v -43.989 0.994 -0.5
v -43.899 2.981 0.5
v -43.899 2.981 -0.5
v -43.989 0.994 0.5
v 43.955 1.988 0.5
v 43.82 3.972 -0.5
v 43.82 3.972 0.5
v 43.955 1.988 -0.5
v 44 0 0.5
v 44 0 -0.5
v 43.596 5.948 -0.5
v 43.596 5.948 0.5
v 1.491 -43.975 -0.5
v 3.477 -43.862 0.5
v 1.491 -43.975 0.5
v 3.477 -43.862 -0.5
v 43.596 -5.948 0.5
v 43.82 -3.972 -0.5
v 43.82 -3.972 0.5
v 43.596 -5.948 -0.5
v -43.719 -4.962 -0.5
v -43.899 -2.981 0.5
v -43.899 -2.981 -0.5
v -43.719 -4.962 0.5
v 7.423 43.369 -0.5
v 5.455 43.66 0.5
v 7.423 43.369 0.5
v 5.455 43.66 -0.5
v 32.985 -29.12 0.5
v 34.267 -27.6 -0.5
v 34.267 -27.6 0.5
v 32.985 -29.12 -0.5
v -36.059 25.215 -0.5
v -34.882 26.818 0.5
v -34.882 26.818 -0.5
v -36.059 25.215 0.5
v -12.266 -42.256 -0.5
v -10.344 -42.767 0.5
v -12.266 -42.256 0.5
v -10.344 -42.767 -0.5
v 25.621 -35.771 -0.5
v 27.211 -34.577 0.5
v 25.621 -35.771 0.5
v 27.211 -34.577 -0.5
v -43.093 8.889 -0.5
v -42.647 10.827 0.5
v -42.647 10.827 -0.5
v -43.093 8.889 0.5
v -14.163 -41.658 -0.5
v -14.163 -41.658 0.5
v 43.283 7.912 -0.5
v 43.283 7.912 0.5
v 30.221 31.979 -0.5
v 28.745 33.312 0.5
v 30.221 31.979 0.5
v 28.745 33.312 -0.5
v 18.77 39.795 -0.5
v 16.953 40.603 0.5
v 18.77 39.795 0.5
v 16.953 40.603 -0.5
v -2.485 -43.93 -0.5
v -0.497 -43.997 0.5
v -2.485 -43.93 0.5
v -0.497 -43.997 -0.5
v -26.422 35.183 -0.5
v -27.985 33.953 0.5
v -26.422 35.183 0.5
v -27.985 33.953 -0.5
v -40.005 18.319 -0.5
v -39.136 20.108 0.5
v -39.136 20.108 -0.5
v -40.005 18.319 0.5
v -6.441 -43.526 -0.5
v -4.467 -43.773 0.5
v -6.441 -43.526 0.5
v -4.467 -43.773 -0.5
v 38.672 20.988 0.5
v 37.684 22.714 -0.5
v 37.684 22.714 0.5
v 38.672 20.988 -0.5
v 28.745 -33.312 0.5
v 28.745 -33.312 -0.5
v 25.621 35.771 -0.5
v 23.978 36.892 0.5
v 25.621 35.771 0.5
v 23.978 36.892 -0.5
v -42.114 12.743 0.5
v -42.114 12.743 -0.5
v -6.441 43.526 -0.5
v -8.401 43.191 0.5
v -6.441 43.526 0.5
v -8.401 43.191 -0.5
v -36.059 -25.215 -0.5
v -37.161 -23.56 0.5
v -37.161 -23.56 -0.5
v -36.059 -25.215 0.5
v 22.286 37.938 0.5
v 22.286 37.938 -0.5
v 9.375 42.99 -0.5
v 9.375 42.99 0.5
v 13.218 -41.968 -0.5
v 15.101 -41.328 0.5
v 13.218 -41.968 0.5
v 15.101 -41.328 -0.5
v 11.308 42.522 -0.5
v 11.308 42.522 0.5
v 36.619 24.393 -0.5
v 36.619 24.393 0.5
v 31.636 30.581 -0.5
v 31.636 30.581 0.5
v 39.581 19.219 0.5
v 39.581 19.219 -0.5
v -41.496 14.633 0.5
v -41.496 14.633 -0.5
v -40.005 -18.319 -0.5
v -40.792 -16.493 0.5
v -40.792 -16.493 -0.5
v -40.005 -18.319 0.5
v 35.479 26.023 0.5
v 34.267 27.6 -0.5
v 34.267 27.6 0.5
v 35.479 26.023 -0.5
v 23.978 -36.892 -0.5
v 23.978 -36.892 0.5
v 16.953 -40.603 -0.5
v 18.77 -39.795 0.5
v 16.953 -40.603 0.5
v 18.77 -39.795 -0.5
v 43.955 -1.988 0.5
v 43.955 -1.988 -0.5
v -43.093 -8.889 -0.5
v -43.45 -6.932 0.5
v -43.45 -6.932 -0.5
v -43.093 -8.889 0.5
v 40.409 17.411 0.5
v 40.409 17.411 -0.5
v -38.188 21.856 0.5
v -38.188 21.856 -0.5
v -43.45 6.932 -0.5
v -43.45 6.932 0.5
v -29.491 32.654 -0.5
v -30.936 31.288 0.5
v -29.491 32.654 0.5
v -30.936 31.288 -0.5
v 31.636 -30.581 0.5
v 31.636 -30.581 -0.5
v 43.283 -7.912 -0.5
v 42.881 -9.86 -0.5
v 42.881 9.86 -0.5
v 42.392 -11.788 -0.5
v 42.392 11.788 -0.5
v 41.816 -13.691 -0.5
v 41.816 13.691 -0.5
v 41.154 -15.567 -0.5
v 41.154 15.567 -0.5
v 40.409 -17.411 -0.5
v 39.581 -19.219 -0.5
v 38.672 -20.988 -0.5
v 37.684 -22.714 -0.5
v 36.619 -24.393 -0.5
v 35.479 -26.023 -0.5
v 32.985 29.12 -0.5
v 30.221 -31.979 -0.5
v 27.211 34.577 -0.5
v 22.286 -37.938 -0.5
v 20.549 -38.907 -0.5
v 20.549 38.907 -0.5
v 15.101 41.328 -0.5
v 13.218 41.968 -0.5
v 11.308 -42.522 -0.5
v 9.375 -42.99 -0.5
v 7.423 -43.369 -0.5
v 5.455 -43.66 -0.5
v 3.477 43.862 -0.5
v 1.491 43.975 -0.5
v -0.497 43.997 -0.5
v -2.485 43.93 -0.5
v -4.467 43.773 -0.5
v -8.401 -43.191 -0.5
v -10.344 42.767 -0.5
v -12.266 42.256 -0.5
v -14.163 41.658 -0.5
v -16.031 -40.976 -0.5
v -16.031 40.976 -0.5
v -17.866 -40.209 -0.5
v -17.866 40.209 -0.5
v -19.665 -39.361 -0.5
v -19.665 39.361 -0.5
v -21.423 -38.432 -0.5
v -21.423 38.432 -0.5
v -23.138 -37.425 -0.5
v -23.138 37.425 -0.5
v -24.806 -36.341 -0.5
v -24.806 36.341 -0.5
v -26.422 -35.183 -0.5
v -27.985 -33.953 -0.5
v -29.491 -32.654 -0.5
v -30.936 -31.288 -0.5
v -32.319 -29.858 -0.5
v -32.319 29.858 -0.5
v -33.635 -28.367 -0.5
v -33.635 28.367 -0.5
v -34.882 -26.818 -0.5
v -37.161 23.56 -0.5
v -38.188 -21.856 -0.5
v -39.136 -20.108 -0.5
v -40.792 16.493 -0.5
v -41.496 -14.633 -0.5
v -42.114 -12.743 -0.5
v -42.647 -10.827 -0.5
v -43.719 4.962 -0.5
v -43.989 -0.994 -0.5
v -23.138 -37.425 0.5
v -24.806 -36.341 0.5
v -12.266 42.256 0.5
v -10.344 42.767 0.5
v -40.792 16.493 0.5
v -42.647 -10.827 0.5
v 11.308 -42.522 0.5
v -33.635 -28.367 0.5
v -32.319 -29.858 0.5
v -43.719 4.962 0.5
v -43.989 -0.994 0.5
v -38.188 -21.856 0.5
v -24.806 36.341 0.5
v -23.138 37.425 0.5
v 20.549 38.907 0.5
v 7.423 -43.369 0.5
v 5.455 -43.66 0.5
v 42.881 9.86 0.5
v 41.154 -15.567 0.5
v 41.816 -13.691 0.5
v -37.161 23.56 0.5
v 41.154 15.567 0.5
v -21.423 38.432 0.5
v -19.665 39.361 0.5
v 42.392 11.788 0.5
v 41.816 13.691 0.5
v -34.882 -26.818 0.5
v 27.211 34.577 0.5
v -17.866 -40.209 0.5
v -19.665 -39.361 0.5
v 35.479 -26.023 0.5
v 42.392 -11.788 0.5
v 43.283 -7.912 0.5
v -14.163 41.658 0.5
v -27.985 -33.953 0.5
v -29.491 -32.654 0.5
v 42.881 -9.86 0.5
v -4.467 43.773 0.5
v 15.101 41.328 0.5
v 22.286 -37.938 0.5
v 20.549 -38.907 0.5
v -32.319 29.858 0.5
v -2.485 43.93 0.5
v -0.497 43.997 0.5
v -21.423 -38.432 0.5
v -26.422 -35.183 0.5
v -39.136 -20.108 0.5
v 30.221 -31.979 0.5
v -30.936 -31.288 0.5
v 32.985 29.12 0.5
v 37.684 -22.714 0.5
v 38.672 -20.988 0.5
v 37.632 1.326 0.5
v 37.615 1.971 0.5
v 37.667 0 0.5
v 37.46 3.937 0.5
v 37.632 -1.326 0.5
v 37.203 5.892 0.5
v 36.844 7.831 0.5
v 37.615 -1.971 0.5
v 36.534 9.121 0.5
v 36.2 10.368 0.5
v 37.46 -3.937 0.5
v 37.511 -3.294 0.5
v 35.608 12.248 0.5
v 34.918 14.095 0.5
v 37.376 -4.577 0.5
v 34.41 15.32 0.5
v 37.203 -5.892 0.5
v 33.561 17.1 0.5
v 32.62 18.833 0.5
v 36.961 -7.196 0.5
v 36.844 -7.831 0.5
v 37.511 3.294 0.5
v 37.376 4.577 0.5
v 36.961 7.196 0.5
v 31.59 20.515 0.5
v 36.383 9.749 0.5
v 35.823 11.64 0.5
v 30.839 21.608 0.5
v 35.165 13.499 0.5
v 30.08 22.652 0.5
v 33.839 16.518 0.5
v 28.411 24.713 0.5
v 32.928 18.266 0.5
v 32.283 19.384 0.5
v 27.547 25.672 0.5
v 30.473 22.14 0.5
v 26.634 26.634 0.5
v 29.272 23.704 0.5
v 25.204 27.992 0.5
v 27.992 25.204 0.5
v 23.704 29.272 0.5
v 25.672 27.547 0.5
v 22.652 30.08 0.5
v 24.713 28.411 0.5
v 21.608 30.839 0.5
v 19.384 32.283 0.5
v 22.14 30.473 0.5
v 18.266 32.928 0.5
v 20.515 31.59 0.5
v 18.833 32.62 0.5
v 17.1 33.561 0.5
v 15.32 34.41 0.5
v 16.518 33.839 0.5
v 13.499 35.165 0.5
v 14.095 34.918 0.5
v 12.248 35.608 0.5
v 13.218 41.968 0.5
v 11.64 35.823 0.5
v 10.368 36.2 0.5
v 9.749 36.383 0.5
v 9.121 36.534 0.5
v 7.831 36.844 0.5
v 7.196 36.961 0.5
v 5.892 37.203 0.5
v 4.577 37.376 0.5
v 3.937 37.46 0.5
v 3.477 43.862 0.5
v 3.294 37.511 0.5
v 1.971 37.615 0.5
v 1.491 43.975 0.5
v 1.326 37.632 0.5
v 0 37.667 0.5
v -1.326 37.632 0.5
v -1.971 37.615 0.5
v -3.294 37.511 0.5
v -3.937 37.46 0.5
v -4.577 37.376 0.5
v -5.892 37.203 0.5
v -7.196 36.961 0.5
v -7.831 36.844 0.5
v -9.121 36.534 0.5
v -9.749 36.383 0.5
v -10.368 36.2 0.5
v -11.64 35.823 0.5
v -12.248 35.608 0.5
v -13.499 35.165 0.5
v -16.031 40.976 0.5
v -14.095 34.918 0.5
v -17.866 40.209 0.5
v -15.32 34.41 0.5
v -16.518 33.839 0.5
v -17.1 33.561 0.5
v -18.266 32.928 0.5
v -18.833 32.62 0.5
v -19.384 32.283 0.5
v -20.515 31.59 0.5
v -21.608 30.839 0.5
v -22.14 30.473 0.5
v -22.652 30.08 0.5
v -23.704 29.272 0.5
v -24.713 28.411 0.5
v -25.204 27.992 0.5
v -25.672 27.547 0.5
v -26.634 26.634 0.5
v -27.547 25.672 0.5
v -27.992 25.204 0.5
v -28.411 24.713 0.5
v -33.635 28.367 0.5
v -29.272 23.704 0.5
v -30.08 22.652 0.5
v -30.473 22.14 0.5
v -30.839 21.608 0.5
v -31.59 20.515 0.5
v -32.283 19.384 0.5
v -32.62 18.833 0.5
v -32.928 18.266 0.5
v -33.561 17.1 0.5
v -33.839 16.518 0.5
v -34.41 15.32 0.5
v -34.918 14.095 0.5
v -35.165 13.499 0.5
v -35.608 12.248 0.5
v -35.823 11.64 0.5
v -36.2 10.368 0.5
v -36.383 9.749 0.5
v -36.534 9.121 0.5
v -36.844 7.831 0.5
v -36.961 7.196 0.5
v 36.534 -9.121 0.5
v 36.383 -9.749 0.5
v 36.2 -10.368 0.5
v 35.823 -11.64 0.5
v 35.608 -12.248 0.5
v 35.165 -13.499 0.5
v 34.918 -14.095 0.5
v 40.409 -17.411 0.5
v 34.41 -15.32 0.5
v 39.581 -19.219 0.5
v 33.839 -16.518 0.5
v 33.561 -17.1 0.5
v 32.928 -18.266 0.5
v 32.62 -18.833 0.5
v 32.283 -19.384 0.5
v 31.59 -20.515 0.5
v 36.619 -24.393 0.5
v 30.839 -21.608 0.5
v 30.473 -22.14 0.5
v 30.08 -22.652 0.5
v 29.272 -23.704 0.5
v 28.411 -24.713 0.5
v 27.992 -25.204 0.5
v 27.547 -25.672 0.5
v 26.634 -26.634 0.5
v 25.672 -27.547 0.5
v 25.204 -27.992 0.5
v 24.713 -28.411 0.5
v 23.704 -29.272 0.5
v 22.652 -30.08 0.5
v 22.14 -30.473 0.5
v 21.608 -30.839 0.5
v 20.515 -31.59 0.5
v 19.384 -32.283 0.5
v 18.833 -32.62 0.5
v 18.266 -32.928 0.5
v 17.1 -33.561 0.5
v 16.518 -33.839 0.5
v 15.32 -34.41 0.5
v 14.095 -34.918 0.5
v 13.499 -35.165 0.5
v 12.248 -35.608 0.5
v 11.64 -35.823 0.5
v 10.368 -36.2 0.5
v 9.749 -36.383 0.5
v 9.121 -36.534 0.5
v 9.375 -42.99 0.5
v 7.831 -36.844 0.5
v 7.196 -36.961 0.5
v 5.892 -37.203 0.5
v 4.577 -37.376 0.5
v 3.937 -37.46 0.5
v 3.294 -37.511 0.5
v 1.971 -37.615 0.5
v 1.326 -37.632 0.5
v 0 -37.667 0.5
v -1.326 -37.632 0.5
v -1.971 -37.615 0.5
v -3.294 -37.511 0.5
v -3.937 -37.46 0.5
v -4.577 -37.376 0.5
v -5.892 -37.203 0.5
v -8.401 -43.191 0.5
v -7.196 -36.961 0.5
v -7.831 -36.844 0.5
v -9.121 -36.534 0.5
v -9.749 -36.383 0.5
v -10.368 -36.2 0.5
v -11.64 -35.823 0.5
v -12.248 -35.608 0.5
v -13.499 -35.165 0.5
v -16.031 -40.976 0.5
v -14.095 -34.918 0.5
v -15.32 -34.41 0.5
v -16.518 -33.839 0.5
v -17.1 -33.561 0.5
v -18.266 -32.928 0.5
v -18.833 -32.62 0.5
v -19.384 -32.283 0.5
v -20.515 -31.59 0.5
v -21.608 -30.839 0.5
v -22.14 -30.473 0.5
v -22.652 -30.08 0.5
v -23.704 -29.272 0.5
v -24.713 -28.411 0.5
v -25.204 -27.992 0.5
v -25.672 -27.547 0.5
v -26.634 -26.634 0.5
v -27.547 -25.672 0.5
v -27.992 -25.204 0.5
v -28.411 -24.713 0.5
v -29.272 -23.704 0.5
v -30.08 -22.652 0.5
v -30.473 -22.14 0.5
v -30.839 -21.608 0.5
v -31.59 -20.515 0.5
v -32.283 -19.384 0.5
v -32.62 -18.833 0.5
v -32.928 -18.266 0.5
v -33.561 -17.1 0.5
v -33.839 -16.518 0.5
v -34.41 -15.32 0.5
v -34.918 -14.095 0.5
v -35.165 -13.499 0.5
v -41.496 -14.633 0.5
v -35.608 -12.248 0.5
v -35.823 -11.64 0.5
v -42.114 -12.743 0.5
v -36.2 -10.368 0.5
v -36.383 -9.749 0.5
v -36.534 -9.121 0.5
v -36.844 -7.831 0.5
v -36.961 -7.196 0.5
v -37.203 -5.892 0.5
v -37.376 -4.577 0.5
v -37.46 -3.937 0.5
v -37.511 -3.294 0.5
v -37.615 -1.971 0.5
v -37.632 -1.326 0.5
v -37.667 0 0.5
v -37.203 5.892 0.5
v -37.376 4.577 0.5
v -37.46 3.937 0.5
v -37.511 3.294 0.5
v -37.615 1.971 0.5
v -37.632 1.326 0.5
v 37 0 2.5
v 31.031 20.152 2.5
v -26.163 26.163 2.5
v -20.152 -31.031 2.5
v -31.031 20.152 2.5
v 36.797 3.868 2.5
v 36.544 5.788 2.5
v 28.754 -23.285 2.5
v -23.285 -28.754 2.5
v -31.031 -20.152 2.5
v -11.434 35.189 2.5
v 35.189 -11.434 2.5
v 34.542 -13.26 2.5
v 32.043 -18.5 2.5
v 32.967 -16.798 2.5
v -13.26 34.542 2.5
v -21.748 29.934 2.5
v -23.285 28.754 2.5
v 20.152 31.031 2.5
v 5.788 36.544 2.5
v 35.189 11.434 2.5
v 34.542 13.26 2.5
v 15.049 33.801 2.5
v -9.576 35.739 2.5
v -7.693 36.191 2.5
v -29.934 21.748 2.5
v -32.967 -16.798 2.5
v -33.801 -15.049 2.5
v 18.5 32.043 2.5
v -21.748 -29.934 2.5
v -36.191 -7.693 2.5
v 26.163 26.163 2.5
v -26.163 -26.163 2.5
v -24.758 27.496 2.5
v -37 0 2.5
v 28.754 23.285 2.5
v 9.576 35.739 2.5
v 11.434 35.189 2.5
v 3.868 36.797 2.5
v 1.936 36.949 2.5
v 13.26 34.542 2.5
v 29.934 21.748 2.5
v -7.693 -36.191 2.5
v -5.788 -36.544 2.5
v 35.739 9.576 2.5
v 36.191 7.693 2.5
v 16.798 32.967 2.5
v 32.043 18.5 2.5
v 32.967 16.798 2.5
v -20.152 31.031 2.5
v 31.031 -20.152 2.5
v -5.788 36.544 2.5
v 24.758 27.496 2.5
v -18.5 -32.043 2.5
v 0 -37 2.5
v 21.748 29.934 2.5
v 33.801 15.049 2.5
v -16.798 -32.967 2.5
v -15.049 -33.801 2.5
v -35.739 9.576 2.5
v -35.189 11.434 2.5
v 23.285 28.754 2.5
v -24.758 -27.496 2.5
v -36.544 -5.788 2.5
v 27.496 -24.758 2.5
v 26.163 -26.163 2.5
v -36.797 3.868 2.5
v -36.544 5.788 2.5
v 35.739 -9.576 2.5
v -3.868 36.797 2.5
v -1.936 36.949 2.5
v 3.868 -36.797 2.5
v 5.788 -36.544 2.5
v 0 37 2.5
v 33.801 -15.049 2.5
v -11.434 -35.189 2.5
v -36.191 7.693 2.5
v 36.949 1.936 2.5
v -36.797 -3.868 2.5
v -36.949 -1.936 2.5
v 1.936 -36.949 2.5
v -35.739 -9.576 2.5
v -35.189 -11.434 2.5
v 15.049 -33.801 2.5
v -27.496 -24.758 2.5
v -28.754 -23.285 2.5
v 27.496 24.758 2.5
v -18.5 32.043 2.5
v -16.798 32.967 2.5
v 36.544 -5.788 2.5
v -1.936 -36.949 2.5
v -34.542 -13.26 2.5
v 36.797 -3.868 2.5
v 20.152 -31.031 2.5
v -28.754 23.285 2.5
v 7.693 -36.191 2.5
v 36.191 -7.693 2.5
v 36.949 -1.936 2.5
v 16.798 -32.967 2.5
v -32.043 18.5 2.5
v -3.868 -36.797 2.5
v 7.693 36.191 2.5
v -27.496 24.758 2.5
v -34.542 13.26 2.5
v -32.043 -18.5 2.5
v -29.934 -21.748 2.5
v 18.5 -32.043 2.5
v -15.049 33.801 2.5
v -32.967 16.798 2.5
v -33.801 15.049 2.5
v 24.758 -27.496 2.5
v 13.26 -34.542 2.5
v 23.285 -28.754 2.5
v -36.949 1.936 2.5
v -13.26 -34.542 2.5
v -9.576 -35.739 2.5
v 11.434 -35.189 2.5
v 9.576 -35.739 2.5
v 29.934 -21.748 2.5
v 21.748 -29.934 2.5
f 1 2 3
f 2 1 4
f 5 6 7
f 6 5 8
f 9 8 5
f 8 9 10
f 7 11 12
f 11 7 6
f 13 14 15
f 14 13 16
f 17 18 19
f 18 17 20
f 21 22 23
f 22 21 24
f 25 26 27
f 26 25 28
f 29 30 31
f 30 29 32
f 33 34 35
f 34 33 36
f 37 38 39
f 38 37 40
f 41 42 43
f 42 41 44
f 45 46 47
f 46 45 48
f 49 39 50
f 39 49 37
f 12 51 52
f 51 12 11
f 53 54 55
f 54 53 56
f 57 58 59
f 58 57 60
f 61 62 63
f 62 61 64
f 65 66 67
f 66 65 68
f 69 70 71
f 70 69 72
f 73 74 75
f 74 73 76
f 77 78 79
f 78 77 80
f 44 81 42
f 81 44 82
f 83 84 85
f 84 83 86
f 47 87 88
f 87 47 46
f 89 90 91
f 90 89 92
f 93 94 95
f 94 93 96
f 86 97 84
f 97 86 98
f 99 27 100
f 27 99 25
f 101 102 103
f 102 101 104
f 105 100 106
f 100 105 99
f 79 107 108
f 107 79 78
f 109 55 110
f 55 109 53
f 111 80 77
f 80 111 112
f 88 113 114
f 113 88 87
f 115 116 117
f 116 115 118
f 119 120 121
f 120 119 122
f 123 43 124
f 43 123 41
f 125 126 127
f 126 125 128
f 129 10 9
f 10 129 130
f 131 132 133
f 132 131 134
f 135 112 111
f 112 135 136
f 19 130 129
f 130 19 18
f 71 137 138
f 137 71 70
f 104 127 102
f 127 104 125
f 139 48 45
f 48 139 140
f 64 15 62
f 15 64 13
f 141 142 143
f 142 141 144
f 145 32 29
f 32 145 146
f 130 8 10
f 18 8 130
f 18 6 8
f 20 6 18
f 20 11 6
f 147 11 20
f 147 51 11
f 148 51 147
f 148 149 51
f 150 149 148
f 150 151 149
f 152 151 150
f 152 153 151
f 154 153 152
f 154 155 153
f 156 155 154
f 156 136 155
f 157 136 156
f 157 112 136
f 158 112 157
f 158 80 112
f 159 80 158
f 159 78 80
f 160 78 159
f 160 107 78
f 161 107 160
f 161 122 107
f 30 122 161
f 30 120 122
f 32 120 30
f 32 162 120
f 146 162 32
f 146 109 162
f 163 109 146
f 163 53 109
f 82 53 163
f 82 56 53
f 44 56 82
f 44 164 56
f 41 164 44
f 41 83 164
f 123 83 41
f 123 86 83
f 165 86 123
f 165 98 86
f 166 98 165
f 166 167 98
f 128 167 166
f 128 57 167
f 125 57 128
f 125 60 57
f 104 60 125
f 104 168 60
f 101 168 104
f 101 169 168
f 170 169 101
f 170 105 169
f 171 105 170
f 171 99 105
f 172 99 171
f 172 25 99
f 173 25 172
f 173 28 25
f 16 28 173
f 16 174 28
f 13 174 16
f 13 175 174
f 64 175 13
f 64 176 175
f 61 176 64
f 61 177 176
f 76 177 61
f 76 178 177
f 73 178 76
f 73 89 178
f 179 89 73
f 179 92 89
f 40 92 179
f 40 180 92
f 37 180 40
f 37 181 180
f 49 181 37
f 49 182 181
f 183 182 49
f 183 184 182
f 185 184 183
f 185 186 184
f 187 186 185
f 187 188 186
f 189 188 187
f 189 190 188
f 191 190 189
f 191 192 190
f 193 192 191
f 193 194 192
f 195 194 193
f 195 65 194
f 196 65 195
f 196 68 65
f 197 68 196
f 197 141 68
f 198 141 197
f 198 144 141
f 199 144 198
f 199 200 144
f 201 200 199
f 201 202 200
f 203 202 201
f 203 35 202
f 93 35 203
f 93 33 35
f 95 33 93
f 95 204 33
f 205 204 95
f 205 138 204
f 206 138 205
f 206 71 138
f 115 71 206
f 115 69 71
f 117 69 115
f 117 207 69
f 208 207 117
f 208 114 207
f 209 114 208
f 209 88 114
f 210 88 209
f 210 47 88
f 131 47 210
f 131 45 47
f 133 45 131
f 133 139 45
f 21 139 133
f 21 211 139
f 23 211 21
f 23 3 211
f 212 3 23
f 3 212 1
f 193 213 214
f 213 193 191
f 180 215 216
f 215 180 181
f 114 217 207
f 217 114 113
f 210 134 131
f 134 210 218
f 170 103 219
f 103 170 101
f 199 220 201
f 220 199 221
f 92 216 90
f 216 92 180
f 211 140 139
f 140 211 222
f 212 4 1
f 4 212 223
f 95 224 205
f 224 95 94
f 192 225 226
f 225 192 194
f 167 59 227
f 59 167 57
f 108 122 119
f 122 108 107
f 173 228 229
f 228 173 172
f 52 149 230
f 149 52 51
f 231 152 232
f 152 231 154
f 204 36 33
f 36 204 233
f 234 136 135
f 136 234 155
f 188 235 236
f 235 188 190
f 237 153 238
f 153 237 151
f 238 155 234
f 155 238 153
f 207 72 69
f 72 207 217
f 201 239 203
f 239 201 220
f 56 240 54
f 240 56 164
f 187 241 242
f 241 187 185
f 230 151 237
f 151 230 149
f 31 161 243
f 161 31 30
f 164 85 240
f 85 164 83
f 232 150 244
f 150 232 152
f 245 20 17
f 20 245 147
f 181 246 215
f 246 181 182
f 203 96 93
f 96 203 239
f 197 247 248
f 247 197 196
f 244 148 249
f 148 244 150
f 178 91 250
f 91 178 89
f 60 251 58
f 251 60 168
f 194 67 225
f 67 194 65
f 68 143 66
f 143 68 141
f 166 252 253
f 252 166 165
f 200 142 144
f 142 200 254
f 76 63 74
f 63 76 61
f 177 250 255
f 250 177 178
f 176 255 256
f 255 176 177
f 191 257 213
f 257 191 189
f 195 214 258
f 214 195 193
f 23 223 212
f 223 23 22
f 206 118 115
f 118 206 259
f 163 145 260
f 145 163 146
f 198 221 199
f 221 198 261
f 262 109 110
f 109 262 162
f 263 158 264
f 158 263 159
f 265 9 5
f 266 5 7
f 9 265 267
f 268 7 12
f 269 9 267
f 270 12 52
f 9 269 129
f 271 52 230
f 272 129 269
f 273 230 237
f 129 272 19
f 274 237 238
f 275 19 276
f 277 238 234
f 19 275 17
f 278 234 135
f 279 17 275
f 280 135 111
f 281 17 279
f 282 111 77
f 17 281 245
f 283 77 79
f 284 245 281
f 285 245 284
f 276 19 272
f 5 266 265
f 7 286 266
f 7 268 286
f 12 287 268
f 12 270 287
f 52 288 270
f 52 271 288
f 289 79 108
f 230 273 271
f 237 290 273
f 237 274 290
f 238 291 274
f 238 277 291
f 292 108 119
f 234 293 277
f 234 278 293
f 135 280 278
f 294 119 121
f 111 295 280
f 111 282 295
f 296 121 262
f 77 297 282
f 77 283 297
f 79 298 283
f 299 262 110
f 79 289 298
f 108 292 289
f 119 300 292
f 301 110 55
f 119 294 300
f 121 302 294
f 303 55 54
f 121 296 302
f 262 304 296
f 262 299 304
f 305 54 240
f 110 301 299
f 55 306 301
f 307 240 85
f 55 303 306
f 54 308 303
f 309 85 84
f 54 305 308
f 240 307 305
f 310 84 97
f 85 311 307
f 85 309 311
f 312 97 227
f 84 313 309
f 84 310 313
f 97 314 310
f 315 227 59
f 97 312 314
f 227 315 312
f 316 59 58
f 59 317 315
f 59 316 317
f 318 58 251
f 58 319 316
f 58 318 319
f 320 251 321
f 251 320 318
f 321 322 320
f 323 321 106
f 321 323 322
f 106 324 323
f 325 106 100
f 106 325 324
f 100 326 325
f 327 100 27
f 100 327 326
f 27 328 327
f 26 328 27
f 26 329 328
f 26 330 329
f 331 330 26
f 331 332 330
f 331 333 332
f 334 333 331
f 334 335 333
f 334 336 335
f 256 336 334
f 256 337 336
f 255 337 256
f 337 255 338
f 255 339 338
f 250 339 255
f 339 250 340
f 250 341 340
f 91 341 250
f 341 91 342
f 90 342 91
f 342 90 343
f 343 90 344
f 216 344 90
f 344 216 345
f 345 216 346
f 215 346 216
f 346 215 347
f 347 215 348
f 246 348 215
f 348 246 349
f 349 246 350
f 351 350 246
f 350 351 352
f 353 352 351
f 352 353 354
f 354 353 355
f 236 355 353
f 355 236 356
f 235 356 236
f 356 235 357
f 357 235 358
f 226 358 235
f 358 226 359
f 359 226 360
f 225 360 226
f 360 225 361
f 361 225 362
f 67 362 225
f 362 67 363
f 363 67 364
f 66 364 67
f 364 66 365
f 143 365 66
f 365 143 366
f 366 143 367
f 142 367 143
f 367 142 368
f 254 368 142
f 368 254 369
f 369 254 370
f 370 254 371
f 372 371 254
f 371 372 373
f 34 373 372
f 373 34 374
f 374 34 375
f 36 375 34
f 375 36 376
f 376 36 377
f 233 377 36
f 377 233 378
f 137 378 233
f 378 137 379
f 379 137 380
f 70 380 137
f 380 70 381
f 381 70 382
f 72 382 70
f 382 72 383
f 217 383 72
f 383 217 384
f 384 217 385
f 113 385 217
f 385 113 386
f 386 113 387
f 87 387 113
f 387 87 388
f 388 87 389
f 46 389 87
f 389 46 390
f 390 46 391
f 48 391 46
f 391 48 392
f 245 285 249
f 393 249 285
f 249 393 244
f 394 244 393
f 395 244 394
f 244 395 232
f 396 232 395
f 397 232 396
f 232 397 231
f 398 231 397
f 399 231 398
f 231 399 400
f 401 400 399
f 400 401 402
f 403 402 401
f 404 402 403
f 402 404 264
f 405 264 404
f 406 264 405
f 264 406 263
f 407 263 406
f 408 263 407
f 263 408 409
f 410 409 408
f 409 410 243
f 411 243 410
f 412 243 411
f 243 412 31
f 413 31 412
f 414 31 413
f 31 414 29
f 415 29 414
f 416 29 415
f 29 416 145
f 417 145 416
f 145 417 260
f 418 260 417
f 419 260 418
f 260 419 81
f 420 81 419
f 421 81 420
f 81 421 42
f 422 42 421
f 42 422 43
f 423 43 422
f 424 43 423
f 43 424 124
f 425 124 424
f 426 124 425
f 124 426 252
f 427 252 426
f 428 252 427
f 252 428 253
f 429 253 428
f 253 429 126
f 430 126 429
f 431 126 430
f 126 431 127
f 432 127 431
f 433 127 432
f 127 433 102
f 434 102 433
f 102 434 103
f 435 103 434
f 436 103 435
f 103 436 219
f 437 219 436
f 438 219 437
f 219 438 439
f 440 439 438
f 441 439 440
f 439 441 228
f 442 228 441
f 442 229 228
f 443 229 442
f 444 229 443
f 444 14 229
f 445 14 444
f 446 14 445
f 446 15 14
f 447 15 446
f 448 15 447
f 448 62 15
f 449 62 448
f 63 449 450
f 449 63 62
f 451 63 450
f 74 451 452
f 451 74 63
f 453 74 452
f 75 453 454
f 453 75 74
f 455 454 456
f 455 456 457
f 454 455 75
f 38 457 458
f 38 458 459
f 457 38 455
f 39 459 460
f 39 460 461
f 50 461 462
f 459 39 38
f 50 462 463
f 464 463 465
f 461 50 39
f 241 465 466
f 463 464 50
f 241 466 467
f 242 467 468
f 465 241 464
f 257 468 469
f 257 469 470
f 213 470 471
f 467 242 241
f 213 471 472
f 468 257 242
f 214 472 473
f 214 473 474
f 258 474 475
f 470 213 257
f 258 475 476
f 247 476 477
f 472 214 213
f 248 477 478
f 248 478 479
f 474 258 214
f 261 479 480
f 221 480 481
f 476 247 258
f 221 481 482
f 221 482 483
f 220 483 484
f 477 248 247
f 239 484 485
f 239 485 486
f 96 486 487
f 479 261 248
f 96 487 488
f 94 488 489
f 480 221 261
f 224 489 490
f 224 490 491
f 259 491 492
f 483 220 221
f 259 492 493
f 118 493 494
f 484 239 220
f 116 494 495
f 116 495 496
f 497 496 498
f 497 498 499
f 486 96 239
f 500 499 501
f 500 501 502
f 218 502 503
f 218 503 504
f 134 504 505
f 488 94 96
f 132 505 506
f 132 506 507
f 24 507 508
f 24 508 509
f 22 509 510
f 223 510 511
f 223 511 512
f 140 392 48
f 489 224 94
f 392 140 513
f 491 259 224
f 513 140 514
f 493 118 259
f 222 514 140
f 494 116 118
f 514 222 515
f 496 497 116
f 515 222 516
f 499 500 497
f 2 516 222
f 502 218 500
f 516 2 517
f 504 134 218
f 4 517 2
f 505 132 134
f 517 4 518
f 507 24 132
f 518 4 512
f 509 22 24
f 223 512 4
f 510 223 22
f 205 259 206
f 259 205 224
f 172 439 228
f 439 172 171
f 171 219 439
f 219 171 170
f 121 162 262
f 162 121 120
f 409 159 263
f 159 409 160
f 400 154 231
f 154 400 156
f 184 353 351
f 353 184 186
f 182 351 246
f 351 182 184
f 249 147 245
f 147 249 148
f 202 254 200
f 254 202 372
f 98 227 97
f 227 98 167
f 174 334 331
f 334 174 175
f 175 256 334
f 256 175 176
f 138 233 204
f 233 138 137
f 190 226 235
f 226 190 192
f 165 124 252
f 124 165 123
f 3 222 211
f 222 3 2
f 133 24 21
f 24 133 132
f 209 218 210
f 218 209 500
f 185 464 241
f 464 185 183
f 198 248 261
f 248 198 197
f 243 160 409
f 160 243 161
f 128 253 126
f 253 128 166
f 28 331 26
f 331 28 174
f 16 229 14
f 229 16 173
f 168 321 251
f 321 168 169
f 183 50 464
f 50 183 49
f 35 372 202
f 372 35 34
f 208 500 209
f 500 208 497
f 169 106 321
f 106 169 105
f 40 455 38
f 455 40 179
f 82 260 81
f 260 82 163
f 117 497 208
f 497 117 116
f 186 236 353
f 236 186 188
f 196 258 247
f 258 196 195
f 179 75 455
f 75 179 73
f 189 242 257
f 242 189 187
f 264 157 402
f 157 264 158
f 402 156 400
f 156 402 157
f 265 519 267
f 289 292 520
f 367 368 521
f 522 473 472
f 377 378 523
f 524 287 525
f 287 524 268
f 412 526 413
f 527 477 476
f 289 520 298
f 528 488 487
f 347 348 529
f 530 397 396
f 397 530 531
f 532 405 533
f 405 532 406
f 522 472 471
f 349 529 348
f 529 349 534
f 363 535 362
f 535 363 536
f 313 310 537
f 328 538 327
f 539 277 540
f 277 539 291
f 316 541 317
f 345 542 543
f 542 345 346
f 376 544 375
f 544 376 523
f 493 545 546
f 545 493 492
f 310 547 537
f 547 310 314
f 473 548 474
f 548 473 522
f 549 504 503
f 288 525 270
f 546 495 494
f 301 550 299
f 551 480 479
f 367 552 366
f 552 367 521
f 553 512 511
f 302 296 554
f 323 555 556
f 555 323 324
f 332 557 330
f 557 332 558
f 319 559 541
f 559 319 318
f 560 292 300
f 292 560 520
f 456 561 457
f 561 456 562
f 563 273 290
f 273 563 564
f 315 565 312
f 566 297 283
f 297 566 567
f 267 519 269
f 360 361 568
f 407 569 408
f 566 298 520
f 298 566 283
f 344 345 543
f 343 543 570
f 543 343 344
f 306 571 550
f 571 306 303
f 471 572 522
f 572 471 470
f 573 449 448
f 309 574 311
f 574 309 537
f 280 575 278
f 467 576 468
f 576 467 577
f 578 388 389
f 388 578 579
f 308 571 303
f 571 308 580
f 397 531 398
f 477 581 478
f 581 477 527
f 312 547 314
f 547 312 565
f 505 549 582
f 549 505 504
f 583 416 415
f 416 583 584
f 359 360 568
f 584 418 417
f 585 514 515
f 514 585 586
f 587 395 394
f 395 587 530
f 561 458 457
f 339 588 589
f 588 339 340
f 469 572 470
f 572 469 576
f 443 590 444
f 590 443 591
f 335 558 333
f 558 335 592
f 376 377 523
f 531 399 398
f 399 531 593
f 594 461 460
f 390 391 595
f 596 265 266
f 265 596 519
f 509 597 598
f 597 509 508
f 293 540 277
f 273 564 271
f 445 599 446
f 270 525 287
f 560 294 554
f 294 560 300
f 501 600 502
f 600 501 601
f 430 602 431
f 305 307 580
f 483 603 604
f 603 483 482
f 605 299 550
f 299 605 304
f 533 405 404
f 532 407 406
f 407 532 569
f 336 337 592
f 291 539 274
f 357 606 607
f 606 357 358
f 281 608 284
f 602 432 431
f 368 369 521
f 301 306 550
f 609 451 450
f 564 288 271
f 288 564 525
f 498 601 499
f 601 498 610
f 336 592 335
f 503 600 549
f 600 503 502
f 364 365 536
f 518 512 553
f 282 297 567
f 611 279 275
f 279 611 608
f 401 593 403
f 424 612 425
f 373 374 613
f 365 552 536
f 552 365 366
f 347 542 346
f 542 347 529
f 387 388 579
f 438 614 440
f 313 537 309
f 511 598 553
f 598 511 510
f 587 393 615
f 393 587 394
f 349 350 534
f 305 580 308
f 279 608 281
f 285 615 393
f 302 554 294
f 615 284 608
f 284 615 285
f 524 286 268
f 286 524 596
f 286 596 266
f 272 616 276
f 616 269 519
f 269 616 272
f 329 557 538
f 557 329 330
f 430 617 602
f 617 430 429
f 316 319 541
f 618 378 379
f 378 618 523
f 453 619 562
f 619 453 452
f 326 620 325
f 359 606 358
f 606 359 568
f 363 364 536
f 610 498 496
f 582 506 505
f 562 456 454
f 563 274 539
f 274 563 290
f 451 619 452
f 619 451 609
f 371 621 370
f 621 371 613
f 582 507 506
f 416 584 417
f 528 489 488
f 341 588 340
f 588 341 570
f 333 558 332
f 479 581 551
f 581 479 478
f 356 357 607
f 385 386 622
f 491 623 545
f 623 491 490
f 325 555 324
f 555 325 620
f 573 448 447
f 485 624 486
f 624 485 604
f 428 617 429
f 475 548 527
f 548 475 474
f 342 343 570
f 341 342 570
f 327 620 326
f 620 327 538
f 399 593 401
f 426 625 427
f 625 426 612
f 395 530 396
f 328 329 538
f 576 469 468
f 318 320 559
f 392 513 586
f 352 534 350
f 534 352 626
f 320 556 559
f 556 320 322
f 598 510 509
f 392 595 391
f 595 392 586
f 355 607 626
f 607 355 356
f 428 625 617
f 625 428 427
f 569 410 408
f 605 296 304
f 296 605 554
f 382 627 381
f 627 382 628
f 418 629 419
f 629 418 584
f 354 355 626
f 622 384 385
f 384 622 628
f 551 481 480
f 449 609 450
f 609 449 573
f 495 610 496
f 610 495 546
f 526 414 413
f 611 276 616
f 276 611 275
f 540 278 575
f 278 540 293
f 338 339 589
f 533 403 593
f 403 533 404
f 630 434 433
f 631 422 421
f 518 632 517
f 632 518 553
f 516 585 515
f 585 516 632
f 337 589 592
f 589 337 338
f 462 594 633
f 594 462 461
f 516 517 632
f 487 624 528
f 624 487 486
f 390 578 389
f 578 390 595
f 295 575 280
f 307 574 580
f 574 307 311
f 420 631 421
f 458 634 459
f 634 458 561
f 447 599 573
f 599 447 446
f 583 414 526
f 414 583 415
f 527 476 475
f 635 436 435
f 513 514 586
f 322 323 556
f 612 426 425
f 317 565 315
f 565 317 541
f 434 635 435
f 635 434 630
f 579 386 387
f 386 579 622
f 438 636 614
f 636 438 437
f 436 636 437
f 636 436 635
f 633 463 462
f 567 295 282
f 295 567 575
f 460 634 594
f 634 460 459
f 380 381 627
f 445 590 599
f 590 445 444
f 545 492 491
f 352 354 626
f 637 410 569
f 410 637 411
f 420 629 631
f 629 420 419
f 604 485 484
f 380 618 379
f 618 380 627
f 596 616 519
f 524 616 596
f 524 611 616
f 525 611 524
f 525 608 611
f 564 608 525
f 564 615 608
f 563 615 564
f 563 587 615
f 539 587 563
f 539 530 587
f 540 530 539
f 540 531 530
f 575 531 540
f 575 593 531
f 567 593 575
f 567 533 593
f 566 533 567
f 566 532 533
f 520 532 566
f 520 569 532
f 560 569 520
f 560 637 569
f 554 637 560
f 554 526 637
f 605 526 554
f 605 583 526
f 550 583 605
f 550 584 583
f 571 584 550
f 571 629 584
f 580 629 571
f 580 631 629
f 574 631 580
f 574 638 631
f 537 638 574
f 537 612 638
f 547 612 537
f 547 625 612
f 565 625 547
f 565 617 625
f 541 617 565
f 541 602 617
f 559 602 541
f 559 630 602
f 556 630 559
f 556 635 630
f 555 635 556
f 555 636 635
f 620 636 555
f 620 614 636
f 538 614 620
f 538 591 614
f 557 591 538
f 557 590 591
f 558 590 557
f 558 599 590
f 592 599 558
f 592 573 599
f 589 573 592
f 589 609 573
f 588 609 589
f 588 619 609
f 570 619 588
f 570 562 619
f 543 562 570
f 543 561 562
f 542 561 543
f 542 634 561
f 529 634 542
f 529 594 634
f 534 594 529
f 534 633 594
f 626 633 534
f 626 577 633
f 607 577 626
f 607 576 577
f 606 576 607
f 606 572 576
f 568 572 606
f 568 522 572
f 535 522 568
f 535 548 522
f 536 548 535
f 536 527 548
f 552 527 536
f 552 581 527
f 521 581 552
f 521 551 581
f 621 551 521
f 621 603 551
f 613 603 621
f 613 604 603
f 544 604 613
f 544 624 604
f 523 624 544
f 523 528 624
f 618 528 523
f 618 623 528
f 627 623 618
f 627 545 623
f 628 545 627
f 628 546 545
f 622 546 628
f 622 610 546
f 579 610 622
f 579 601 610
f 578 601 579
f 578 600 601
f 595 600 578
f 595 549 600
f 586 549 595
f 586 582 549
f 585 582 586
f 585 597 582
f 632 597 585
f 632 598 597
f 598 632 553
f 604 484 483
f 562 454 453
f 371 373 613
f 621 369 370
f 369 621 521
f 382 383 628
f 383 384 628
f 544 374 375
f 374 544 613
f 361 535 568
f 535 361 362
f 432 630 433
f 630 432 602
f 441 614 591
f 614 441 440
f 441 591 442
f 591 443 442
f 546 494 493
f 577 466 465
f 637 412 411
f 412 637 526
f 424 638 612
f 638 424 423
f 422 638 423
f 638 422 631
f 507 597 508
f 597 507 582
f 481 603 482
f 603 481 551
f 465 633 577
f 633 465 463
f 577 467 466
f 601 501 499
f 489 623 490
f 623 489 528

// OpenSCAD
//内径75mm，外径90mm
cylinder(h = 1, r = 44, center = true, $fn = 0, $fa = 1, $fs = 2);
translate([0, 0, 1]) {
    cylinder(h = 3, r1 = 38, r2 = 37, center = true, $fn = 0, $fa = 1, $fs = 2);
}
